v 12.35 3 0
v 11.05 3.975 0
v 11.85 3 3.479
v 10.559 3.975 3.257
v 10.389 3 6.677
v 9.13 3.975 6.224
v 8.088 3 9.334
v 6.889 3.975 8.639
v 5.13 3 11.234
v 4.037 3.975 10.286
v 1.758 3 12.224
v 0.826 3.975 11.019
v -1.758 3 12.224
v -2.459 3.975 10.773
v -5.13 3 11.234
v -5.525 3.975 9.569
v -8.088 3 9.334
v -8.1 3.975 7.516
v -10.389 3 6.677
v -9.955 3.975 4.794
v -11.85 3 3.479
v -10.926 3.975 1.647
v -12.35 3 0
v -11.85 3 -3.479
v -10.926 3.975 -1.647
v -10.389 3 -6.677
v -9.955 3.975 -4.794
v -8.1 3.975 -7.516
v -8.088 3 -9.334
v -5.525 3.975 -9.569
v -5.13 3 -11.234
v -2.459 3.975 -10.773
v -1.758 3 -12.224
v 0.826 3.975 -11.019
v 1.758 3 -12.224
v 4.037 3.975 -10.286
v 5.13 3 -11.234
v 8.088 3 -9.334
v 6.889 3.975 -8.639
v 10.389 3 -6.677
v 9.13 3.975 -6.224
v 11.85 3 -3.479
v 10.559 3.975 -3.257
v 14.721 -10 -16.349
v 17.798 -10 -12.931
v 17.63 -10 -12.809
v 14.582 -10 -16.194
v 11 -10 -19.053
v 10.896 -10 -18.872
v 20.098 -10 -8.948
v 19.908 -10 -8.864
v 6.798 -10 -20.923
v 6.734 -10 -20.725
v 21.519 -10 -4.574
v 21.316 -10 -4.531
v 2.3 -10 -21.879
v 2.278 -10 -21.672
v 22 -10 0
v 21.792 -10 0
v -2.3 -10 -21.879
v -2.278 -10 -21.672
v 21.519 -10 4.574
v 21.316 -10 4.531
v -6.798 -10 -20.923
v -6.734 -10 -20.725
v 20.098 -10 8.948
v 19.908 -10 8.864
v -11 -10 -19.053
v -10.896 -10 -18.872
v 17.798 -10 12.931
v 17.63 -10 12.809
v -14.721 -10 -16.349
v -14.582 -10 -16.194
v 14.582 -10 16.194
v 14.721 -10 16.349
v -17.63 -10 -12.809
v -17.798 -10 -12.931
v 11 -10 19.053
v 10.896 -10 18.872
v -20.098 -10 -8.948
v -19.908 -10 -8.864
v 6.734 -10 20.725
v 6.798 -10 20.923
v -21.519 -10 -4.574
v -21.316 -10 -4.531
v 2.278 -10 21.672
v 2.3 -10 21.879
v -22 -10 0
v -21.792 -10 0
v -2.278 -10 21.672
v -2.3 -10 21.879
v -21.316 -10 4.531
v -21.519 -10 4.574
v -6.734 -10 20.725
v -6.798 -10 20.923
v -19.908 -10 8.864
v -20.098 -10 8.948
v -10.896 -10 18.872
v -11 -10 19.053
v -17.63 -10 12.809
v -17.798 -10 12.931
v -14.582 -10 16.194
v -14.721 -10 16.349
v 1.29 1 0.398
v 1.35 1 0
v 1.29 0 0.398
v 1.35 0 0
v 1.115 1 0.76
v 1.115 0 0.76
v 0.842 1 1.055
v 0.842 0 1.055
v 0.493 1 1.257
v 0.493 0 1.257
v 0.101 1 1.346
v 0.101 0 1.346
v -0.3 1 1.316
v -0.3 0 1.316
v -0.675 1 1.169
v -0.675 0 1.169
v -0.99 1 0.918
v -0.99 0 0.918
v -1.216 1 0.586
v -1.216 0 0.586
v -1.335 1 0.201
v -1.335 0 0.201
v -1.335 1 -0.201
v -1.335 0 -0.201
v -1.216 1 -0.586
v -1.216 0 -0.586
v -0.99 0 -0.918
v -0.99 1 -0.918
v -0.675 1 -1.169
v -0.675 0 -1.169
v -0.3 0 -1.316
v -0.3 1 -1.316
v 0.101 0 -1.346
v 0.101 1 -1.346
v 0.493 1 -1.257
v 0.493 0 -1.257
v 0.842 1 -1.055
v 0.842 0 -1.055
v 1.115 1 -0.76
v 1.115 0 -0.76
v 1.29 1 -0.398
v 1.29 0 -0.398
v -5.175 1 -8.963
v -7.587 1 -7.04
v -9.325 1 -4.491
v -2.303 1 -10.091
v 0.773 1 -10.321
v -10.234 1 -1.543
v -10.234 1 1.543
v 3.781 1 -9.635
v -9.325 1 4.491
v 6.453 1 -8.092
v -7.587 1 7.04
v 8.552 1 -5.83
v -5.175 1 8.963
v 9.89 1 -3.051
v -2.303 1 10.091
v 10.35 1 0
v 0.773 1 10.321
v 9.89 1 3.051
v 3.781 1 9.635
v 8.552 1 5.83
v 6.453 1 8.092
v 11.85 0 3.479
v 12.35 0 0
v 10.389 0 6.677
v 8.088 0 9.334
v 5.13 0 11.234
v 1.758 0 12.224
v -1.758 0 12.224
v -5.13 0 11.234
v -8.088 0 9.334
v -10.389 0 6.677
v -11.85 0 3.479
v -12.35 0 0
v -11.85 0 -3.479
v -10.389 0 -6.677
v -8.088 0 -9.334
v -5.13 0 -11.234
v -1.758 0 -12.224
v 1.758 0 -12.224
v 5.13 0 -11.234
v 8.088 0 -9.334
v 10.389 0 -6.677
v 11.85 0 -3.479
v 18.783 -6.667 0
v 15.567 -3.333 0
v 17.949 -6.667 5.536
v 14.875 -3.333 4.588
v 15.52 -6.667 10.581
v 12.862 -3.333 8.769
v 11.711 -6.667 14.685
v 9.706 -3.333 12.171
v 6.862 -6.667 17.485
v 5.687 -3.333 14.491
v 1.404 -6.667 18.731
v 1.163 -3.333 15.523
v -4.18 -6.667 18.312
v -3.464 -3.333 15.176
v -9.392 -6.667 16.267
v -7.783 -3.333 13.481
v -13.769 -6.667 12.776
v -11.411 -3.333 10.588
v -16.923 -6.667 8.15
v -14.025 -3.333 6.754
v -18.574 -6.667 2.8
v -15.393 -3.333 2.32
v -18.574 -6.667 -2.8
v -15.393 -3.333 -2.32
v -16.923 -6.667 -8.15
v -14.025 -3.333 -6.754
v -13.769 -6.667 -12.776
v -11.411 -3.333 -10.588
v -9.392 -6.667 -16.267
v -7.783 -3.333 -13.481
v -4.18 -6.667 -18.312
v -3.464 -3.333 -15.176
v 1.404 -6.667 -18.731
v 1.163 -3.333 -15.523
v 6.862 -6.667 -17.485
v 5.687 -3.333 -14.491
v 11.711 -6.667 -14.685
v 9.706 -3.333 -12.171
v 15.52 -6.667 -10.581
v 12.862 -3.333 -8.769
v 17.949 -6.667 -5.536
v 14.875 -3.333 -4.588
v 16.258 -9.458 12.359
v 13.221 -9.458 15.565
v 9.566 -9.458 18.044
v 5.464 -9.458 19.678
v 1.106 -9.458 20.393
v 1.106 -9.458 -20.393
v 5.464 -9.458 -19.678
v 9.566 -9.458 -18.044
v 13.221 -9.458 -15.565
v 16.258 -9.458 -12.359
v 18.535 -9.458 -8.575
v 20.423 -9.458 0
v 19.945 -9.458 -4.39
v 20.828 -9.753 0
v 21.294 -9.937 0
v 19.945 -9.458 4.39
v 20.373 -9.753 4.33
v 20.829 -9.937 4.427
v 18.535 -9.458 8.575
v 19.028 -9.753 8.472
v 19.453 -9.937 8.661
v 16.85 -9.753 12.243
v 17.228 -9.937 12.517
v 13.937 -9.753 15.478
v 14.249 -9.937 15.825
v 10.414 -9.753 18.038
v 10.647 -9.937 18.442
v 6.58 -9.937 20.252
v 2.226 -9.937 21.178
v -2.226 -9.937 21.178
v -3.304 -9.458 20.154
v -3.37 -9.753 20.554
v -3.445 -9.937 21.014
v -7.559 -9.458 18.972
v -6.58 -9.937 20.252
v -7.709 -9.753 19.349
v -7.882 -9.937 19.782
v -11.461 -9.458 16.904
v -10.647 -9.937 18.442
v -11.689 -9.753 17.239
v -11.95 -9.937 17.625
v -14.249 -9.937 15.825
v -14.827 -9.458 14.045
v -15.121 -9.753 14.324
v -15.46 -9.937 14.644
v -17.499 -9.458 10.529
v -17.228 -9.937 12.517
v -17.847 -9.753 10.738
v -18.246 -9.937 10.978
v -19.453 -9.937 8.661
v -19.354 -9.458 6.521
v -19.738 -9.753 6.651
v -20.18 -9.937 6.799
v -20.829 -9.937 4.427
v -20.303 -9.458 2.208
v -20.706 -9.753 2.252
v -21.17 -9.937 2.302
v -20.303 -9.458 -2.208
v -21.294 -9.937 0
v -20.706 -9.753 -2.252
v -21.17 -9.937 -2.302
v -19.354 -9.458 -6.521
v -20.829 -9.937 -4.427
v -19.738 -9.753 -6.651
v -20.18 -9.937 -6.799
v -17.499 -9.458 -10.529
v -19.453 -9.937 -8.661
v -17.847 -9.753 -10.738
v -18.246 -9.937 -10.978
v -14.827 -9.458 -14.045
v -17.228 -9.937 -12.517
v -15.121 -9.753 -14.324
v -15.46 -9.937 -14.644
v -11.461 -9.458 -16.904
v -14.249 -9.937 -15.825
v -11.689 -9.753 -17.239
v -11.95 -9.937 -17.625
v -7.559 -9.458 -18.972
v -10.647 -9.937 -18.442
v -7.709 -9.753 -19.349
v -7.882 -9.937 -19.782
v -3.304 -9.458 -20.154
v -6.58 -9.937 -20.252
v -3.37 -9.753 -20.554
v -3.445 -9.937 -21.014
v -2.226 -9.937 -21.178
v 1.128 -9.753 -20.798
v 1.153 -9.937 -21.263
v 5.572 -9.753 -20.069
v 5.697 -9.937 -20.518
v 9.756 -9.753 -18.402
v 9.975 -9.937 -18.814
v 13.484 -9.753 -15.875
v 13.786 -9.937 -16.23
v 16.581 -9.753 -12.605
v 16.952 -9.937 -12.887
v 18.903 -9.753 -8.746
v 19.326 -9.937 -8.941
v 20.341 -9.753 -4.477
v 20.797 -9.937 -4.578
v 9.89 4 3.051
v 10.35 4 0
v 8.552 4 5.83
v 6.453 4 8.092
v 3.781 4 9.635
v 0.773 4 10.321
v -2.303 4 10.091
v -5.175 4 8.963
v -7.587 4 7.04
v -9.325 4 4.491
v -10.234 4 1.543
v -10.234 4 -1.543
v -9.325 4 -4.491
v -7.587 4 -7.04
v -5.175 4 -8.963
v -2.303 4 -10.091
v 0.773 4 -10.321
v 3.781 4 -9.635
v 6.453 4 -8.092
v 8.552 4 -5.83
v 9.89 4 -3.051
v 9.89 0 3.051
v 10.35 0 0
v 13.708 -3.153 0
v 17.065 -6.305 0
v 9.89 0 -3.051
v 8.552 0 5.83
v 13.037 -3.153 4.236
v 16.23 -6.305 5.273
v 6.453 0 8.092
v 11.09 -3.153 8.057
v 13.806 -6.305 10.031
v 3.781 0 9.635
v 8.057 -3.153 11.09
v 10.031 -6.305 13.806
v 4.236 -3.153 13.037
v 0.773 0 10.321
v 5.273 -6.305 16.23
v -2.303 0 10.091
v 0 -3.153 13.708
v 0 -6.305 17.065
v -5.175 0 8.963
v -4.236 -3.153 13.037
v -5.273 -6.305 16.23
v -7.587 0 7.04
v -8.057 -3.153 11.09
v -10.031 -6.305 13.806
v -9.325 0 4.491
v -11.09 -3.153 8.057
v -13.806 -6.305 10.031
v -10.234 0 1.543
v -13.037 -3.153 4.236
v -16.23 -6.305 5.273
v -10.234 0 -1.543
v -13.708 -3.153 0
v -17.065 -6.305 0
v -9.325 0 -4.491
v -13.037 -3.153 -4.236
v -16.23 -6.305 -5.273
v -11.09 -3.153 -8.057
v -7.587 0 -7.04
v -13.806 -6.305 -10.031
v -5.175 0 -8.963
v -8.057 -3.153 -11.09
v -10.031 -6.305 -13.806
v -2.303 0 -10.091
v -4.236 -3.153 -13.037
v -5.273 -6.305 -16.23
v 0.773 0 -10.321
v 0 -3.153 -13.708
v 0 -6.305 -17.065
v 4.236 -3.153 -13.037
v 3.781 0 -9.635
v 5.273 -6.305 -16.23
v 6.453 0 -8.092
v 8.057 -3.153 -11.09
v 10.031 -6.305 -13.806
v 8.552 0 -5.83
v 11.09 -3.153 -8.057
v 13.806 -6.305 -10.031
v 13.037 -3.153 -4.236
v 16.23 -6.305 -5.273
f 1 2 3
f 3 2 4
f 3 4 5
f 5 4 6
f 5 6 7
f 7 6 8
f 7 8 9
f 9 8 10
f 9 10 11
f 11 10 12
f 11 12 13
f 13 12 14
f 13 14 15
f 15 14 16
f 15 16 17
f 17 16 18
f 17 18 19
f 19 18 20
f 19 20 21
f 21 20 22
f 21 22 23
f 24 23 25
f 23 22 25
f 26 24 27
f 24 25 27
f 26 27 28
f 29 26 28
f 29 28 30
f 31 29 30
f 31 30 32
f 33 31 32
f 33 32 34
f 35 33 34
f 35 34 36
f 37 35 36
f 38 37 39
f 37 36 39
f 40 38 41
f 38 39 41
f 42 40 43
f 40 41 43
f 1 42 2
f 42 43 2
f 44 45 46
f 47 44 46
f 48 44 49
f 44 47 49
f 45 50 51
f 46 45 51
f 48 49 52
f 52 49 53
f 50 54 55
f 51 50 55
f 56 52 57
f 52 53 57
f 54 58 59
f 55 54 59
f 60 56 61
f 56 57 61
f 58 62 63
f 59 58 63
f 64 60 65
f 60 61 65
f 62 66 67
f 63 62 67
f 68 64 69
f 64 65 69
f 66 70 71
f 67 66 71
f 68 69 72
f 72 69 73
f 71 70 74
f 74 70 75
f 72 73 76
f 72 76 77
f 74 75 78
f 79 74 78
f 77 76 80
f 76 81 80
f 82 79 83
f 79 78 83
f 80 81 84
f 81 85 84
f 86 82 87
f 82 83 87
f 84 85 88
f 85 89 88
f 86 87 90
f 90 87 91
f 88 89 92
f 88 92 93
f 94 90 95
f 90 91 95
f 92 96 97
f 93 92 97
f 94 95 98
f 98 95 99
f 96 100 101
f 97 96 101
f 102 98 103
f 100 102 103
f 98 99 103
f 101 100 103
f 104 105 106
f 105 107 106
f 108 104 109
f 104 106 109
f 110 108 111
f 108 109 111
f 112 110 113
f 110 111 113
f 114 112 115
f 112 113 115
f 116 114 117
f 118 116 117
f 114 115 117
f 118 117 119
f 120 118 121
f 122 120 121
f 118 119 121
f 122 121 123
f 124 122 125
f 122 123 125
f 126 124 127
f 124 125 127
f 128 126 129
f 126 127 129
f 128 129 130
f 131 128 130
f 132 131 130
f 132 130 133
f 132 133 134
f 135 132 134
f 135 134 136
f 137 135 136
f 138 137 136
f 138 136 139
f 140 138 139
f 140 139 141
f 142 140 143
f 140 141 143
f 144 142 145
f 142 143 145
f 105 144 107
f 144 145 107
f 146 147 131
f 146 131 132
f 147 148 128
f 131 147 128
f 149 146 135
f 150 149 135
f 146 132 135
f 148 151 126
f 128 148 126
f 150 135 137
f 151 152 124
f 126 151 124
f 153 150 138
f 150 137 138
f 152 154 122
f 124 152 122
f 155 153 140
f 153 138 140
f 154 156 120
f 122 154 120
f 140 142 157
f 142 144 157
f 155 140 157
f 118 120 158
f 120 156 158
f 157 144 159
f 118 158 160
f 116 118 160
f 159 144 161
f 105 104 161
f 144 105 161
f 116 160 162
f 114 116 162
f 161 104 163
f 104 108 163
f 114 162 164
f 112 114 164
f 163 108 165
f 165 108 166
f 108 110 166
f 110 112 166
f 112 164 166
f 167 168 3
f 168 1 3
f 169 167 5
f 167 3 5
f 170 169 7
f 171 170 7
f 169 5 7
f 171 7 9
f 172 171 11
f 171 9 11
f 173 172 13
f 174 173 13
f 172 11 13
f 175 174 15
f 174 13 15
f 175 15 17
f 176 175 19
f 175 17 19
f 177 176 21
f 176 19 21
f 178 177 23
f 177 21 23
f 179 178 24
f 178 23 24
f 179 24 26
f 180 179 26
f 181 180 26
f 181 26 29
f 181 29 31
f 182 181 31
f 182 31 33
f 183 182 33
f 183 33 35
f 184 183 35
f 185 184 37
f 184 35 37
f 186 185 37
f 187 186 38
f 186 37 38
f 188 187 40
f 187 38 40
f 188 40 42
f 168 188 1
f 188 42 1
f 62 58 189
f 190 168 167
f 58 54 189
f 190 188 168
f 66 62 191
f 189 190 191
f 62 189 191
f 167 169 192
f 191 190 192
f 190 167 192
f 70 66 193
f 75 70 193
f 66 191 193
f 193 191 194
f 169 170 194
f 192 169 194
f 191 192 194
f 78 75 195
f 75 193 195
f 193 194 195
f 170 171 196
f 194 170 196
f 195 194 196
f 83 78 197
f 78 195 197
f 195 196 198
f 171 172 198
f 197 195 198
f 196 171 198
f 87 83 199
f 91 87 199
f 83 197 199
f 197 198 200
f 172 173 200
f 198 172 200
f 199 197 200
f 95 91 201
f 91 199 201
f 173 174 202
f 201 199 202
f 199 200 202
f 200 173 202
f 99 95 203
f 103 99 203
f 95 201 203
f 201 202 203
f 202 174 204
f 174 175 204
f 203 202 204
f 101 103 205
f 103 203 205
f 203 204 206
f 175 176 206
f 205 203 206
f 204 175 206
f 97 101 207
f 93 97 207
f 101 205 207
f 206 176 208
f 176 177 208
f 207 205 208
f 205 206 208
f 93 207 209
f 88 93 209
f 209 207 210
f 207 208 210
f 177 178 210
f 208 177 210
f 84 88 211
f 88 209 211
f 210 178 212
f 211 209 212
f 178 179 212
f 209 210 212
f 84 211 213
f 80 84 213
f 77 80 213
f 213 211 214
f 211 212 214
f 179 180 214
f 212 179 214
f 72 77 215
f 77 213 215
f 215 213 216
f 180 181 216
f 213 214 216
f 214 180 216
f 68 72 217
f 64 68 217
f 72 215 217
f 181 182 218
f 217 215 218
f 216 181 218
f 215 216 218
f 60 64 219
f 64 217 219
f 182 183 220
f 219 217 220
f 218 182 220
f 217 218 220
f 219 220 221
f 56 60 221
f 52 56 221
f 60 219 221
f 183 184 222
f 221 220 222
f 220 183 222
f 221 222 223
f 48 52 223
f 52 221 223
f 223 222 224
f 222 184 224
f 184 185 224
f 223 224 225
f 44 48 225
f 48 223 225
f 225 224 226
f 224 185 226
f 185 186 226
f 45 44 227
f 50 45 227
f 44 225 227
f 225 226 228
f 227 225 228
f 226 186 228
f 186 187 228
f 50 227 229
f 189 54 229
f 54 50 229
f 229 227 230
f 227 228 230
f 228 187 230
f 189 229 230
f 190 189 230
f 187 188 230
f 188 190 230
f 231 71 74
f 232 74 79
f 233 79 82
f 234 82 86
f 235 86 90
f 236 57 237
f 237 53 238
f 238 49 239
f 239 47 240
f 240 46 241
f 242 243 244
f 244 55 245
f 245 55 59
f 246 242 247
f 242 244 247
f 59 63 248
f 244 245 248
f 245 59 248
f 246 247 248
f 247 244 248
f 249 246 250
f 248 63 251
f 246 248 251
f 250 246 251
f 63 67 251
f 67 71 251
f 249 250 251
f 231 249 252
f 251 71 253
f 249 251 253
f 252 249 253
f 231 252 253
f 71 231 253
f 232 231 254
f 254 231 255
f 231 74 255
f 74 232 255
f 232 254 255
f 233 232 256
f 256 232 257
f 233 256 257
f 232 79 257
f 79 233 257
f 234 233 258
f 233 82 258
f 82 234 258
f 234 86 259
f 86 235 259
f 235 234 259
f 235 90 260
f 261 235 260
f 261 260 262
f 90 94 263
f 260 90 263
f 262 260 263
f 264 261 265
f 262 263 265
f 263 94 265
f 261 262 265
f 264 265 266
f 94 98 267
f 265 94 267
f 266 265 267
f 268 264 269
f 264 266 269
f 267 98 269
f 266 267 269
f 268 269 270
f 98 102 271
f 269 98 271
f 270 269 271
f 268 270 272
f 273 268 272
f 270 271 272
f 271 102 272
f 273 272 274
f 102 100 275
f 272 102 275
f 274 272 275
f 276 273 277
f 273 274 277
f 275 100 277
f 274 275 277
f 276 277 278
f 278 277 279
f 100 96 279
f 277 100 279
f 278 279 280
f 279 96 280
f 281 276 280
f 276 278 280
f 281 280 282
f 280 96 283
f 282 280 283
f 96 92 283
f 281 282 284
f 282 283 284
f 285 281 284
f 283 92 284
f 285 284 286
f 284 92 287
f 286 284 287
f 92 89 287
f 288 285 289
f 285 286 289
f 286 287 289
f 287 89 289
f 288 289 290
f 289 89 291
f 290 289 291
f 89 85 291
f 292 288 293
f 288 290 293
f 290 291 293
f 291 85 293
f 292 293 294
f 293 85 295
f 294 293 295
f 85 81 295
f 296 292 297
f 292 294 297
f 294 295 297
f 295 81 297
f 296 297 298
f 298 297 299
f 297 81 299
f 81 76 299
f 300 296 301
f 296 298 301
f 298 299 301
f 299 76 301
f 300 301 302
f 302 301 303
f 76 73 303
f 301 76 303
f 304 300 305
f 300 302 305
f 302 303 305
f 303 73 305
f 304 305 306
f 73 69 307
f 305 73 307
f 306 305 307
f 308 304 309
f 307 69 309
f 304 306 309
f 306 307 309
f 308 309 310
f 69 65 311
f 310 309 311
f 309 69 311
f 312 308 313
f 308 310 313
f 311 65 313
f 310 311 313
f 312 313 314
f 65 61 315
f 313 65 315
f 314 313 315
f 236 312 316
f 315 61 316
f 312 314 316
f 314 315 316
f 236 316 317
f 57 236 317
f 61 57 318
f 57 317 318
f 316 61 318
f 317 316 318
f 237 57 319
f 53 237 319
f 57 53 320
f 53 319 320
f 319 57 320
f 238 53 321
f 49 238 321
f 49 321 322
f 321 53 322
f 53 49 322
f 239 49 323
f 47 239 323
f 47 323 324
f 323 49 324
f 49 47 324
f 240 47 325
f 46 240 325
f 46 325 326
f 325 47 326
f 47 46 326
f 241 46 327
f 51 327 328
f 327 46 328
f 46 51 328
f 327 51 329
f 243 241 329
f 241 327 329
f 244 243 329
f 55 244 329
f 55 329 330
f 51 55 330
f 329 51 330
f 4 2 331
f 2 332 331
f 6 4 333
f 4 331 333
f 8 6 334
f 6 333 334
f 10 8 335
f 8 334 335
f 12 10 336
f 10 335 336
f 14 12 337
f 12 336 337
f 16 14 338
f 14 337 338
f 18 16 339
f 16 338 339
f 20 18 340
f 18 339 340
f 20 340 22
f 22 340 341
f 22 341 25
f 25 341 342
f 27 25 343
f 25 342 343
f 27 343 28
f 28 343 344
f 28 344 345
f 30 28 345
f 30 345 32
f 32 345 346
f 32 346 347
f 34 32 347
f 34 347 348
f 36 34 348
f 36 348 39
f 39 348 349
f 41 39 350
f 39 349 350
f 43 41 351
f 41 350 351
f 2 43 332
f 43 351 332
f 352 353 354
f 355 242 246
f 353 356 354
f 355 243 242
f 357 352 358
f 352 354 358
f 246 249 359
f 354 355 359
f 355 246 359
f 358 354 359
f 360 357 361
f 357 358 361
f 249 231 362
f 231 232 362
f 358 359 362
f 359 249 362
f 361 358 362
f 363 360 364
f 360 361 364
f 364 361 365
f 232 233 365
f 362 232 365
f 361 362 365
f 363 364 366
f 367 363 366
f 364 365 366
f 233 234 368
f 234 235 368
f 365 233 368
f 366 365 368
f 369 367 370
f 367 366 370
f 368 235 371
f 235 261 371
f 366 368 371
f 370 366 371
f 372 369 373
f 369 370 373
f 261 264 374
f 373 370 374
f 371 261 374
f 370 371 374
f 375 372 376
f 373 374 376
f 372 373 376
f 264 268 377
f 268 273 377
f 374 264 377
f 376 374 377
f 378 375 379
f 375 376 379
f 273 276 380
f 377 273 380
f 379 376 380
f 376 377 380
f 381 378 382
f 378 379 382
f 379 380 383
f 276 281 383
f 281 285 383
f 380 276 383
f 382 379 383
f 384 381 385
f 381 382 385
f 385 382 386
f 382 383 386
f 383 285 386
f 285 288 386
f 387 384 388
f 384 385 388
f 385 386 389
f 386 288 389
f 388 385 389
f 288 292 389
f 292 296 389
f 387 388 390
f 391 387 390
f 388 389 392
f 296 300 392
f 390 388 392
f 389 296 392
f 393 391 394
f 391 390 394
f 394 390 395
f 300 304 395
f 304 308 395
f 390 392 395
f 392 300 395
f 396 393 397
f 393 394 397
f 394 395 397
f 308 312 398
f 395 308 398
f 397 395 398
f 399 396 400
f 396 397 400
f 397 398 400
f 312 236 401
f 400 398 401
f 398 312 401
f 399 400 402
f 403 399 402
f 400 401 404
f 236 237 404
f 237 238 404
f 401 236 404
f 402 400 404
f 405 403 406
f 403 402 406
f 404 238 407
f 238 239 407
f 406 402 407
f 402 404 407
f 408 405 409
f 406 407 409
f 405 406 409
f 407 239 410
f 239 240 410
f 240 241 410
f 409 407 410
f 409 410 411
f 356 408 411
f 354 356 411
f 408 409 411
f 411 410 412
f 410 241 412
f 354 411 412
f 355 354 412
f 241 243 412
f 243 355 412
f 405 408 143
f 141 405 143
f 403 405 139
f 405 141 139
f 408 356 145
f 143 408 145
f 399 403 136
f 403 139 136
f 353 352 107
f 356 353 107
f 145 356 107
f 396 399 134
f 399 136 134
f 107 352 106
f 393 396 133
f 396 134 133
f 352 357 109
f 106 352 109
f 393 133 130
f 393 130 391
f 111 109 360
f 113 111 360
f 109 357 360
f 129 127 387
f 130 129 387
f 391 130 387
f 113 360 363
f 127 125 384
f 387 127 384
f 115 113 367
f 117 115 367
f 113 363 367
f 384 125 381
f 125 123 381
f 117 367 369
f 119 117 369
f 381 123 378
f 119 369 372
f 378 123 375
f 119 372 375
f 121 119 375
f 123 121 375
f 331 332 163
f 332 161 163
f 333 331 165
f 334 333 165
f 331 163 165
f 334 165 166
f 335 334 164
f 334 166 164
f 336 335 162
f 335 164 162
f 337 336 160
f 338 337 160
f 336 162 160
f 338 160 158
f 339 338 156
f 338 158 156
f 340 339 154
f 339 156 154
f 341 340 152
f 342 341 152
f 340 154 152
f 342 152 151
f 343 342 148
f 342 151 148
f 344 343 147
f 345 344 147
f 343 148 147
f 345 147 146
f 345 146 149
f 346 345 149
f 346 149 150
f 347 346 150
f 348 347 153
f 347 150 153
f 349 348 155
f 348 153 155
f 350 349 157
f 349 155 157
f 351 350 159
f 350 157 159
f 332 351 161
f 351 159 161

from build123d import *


with BuildPart() as f1:
    # F0 (on Top) → F1 (revolve)
    with BuildSketch(Plane.XY):
        with BuildLine():
            Line((22, -10), (12.35, 0))
            Line((12.35, 0), (10.35, 0))
            Line((10.35, 0), (20.422777, -9.458007))
            ThreePointArc((20.422777, -9.458007), (21.055595, -9.859572), (21.791797, -10))
            Line((21.791797, -10), (22, -10))
        make_face()
        Polygon((2.037337, 0), (10.35, 0), (10.35, 1), (1.35, 1), (1.35, 0), align=None)
        Polygon((10.35, 0), (12.35, 0), (12.35, 3), (10.35, 3), (10.35, 1), align=None)
        Polygon((10.35, 3), (12.35, 3), (11.049551, 3.974945), (10.35, 4), align=None)
    revolve(axis=Axis((0, -5, 0), (0, -1, 0)))


solid = f1.part
